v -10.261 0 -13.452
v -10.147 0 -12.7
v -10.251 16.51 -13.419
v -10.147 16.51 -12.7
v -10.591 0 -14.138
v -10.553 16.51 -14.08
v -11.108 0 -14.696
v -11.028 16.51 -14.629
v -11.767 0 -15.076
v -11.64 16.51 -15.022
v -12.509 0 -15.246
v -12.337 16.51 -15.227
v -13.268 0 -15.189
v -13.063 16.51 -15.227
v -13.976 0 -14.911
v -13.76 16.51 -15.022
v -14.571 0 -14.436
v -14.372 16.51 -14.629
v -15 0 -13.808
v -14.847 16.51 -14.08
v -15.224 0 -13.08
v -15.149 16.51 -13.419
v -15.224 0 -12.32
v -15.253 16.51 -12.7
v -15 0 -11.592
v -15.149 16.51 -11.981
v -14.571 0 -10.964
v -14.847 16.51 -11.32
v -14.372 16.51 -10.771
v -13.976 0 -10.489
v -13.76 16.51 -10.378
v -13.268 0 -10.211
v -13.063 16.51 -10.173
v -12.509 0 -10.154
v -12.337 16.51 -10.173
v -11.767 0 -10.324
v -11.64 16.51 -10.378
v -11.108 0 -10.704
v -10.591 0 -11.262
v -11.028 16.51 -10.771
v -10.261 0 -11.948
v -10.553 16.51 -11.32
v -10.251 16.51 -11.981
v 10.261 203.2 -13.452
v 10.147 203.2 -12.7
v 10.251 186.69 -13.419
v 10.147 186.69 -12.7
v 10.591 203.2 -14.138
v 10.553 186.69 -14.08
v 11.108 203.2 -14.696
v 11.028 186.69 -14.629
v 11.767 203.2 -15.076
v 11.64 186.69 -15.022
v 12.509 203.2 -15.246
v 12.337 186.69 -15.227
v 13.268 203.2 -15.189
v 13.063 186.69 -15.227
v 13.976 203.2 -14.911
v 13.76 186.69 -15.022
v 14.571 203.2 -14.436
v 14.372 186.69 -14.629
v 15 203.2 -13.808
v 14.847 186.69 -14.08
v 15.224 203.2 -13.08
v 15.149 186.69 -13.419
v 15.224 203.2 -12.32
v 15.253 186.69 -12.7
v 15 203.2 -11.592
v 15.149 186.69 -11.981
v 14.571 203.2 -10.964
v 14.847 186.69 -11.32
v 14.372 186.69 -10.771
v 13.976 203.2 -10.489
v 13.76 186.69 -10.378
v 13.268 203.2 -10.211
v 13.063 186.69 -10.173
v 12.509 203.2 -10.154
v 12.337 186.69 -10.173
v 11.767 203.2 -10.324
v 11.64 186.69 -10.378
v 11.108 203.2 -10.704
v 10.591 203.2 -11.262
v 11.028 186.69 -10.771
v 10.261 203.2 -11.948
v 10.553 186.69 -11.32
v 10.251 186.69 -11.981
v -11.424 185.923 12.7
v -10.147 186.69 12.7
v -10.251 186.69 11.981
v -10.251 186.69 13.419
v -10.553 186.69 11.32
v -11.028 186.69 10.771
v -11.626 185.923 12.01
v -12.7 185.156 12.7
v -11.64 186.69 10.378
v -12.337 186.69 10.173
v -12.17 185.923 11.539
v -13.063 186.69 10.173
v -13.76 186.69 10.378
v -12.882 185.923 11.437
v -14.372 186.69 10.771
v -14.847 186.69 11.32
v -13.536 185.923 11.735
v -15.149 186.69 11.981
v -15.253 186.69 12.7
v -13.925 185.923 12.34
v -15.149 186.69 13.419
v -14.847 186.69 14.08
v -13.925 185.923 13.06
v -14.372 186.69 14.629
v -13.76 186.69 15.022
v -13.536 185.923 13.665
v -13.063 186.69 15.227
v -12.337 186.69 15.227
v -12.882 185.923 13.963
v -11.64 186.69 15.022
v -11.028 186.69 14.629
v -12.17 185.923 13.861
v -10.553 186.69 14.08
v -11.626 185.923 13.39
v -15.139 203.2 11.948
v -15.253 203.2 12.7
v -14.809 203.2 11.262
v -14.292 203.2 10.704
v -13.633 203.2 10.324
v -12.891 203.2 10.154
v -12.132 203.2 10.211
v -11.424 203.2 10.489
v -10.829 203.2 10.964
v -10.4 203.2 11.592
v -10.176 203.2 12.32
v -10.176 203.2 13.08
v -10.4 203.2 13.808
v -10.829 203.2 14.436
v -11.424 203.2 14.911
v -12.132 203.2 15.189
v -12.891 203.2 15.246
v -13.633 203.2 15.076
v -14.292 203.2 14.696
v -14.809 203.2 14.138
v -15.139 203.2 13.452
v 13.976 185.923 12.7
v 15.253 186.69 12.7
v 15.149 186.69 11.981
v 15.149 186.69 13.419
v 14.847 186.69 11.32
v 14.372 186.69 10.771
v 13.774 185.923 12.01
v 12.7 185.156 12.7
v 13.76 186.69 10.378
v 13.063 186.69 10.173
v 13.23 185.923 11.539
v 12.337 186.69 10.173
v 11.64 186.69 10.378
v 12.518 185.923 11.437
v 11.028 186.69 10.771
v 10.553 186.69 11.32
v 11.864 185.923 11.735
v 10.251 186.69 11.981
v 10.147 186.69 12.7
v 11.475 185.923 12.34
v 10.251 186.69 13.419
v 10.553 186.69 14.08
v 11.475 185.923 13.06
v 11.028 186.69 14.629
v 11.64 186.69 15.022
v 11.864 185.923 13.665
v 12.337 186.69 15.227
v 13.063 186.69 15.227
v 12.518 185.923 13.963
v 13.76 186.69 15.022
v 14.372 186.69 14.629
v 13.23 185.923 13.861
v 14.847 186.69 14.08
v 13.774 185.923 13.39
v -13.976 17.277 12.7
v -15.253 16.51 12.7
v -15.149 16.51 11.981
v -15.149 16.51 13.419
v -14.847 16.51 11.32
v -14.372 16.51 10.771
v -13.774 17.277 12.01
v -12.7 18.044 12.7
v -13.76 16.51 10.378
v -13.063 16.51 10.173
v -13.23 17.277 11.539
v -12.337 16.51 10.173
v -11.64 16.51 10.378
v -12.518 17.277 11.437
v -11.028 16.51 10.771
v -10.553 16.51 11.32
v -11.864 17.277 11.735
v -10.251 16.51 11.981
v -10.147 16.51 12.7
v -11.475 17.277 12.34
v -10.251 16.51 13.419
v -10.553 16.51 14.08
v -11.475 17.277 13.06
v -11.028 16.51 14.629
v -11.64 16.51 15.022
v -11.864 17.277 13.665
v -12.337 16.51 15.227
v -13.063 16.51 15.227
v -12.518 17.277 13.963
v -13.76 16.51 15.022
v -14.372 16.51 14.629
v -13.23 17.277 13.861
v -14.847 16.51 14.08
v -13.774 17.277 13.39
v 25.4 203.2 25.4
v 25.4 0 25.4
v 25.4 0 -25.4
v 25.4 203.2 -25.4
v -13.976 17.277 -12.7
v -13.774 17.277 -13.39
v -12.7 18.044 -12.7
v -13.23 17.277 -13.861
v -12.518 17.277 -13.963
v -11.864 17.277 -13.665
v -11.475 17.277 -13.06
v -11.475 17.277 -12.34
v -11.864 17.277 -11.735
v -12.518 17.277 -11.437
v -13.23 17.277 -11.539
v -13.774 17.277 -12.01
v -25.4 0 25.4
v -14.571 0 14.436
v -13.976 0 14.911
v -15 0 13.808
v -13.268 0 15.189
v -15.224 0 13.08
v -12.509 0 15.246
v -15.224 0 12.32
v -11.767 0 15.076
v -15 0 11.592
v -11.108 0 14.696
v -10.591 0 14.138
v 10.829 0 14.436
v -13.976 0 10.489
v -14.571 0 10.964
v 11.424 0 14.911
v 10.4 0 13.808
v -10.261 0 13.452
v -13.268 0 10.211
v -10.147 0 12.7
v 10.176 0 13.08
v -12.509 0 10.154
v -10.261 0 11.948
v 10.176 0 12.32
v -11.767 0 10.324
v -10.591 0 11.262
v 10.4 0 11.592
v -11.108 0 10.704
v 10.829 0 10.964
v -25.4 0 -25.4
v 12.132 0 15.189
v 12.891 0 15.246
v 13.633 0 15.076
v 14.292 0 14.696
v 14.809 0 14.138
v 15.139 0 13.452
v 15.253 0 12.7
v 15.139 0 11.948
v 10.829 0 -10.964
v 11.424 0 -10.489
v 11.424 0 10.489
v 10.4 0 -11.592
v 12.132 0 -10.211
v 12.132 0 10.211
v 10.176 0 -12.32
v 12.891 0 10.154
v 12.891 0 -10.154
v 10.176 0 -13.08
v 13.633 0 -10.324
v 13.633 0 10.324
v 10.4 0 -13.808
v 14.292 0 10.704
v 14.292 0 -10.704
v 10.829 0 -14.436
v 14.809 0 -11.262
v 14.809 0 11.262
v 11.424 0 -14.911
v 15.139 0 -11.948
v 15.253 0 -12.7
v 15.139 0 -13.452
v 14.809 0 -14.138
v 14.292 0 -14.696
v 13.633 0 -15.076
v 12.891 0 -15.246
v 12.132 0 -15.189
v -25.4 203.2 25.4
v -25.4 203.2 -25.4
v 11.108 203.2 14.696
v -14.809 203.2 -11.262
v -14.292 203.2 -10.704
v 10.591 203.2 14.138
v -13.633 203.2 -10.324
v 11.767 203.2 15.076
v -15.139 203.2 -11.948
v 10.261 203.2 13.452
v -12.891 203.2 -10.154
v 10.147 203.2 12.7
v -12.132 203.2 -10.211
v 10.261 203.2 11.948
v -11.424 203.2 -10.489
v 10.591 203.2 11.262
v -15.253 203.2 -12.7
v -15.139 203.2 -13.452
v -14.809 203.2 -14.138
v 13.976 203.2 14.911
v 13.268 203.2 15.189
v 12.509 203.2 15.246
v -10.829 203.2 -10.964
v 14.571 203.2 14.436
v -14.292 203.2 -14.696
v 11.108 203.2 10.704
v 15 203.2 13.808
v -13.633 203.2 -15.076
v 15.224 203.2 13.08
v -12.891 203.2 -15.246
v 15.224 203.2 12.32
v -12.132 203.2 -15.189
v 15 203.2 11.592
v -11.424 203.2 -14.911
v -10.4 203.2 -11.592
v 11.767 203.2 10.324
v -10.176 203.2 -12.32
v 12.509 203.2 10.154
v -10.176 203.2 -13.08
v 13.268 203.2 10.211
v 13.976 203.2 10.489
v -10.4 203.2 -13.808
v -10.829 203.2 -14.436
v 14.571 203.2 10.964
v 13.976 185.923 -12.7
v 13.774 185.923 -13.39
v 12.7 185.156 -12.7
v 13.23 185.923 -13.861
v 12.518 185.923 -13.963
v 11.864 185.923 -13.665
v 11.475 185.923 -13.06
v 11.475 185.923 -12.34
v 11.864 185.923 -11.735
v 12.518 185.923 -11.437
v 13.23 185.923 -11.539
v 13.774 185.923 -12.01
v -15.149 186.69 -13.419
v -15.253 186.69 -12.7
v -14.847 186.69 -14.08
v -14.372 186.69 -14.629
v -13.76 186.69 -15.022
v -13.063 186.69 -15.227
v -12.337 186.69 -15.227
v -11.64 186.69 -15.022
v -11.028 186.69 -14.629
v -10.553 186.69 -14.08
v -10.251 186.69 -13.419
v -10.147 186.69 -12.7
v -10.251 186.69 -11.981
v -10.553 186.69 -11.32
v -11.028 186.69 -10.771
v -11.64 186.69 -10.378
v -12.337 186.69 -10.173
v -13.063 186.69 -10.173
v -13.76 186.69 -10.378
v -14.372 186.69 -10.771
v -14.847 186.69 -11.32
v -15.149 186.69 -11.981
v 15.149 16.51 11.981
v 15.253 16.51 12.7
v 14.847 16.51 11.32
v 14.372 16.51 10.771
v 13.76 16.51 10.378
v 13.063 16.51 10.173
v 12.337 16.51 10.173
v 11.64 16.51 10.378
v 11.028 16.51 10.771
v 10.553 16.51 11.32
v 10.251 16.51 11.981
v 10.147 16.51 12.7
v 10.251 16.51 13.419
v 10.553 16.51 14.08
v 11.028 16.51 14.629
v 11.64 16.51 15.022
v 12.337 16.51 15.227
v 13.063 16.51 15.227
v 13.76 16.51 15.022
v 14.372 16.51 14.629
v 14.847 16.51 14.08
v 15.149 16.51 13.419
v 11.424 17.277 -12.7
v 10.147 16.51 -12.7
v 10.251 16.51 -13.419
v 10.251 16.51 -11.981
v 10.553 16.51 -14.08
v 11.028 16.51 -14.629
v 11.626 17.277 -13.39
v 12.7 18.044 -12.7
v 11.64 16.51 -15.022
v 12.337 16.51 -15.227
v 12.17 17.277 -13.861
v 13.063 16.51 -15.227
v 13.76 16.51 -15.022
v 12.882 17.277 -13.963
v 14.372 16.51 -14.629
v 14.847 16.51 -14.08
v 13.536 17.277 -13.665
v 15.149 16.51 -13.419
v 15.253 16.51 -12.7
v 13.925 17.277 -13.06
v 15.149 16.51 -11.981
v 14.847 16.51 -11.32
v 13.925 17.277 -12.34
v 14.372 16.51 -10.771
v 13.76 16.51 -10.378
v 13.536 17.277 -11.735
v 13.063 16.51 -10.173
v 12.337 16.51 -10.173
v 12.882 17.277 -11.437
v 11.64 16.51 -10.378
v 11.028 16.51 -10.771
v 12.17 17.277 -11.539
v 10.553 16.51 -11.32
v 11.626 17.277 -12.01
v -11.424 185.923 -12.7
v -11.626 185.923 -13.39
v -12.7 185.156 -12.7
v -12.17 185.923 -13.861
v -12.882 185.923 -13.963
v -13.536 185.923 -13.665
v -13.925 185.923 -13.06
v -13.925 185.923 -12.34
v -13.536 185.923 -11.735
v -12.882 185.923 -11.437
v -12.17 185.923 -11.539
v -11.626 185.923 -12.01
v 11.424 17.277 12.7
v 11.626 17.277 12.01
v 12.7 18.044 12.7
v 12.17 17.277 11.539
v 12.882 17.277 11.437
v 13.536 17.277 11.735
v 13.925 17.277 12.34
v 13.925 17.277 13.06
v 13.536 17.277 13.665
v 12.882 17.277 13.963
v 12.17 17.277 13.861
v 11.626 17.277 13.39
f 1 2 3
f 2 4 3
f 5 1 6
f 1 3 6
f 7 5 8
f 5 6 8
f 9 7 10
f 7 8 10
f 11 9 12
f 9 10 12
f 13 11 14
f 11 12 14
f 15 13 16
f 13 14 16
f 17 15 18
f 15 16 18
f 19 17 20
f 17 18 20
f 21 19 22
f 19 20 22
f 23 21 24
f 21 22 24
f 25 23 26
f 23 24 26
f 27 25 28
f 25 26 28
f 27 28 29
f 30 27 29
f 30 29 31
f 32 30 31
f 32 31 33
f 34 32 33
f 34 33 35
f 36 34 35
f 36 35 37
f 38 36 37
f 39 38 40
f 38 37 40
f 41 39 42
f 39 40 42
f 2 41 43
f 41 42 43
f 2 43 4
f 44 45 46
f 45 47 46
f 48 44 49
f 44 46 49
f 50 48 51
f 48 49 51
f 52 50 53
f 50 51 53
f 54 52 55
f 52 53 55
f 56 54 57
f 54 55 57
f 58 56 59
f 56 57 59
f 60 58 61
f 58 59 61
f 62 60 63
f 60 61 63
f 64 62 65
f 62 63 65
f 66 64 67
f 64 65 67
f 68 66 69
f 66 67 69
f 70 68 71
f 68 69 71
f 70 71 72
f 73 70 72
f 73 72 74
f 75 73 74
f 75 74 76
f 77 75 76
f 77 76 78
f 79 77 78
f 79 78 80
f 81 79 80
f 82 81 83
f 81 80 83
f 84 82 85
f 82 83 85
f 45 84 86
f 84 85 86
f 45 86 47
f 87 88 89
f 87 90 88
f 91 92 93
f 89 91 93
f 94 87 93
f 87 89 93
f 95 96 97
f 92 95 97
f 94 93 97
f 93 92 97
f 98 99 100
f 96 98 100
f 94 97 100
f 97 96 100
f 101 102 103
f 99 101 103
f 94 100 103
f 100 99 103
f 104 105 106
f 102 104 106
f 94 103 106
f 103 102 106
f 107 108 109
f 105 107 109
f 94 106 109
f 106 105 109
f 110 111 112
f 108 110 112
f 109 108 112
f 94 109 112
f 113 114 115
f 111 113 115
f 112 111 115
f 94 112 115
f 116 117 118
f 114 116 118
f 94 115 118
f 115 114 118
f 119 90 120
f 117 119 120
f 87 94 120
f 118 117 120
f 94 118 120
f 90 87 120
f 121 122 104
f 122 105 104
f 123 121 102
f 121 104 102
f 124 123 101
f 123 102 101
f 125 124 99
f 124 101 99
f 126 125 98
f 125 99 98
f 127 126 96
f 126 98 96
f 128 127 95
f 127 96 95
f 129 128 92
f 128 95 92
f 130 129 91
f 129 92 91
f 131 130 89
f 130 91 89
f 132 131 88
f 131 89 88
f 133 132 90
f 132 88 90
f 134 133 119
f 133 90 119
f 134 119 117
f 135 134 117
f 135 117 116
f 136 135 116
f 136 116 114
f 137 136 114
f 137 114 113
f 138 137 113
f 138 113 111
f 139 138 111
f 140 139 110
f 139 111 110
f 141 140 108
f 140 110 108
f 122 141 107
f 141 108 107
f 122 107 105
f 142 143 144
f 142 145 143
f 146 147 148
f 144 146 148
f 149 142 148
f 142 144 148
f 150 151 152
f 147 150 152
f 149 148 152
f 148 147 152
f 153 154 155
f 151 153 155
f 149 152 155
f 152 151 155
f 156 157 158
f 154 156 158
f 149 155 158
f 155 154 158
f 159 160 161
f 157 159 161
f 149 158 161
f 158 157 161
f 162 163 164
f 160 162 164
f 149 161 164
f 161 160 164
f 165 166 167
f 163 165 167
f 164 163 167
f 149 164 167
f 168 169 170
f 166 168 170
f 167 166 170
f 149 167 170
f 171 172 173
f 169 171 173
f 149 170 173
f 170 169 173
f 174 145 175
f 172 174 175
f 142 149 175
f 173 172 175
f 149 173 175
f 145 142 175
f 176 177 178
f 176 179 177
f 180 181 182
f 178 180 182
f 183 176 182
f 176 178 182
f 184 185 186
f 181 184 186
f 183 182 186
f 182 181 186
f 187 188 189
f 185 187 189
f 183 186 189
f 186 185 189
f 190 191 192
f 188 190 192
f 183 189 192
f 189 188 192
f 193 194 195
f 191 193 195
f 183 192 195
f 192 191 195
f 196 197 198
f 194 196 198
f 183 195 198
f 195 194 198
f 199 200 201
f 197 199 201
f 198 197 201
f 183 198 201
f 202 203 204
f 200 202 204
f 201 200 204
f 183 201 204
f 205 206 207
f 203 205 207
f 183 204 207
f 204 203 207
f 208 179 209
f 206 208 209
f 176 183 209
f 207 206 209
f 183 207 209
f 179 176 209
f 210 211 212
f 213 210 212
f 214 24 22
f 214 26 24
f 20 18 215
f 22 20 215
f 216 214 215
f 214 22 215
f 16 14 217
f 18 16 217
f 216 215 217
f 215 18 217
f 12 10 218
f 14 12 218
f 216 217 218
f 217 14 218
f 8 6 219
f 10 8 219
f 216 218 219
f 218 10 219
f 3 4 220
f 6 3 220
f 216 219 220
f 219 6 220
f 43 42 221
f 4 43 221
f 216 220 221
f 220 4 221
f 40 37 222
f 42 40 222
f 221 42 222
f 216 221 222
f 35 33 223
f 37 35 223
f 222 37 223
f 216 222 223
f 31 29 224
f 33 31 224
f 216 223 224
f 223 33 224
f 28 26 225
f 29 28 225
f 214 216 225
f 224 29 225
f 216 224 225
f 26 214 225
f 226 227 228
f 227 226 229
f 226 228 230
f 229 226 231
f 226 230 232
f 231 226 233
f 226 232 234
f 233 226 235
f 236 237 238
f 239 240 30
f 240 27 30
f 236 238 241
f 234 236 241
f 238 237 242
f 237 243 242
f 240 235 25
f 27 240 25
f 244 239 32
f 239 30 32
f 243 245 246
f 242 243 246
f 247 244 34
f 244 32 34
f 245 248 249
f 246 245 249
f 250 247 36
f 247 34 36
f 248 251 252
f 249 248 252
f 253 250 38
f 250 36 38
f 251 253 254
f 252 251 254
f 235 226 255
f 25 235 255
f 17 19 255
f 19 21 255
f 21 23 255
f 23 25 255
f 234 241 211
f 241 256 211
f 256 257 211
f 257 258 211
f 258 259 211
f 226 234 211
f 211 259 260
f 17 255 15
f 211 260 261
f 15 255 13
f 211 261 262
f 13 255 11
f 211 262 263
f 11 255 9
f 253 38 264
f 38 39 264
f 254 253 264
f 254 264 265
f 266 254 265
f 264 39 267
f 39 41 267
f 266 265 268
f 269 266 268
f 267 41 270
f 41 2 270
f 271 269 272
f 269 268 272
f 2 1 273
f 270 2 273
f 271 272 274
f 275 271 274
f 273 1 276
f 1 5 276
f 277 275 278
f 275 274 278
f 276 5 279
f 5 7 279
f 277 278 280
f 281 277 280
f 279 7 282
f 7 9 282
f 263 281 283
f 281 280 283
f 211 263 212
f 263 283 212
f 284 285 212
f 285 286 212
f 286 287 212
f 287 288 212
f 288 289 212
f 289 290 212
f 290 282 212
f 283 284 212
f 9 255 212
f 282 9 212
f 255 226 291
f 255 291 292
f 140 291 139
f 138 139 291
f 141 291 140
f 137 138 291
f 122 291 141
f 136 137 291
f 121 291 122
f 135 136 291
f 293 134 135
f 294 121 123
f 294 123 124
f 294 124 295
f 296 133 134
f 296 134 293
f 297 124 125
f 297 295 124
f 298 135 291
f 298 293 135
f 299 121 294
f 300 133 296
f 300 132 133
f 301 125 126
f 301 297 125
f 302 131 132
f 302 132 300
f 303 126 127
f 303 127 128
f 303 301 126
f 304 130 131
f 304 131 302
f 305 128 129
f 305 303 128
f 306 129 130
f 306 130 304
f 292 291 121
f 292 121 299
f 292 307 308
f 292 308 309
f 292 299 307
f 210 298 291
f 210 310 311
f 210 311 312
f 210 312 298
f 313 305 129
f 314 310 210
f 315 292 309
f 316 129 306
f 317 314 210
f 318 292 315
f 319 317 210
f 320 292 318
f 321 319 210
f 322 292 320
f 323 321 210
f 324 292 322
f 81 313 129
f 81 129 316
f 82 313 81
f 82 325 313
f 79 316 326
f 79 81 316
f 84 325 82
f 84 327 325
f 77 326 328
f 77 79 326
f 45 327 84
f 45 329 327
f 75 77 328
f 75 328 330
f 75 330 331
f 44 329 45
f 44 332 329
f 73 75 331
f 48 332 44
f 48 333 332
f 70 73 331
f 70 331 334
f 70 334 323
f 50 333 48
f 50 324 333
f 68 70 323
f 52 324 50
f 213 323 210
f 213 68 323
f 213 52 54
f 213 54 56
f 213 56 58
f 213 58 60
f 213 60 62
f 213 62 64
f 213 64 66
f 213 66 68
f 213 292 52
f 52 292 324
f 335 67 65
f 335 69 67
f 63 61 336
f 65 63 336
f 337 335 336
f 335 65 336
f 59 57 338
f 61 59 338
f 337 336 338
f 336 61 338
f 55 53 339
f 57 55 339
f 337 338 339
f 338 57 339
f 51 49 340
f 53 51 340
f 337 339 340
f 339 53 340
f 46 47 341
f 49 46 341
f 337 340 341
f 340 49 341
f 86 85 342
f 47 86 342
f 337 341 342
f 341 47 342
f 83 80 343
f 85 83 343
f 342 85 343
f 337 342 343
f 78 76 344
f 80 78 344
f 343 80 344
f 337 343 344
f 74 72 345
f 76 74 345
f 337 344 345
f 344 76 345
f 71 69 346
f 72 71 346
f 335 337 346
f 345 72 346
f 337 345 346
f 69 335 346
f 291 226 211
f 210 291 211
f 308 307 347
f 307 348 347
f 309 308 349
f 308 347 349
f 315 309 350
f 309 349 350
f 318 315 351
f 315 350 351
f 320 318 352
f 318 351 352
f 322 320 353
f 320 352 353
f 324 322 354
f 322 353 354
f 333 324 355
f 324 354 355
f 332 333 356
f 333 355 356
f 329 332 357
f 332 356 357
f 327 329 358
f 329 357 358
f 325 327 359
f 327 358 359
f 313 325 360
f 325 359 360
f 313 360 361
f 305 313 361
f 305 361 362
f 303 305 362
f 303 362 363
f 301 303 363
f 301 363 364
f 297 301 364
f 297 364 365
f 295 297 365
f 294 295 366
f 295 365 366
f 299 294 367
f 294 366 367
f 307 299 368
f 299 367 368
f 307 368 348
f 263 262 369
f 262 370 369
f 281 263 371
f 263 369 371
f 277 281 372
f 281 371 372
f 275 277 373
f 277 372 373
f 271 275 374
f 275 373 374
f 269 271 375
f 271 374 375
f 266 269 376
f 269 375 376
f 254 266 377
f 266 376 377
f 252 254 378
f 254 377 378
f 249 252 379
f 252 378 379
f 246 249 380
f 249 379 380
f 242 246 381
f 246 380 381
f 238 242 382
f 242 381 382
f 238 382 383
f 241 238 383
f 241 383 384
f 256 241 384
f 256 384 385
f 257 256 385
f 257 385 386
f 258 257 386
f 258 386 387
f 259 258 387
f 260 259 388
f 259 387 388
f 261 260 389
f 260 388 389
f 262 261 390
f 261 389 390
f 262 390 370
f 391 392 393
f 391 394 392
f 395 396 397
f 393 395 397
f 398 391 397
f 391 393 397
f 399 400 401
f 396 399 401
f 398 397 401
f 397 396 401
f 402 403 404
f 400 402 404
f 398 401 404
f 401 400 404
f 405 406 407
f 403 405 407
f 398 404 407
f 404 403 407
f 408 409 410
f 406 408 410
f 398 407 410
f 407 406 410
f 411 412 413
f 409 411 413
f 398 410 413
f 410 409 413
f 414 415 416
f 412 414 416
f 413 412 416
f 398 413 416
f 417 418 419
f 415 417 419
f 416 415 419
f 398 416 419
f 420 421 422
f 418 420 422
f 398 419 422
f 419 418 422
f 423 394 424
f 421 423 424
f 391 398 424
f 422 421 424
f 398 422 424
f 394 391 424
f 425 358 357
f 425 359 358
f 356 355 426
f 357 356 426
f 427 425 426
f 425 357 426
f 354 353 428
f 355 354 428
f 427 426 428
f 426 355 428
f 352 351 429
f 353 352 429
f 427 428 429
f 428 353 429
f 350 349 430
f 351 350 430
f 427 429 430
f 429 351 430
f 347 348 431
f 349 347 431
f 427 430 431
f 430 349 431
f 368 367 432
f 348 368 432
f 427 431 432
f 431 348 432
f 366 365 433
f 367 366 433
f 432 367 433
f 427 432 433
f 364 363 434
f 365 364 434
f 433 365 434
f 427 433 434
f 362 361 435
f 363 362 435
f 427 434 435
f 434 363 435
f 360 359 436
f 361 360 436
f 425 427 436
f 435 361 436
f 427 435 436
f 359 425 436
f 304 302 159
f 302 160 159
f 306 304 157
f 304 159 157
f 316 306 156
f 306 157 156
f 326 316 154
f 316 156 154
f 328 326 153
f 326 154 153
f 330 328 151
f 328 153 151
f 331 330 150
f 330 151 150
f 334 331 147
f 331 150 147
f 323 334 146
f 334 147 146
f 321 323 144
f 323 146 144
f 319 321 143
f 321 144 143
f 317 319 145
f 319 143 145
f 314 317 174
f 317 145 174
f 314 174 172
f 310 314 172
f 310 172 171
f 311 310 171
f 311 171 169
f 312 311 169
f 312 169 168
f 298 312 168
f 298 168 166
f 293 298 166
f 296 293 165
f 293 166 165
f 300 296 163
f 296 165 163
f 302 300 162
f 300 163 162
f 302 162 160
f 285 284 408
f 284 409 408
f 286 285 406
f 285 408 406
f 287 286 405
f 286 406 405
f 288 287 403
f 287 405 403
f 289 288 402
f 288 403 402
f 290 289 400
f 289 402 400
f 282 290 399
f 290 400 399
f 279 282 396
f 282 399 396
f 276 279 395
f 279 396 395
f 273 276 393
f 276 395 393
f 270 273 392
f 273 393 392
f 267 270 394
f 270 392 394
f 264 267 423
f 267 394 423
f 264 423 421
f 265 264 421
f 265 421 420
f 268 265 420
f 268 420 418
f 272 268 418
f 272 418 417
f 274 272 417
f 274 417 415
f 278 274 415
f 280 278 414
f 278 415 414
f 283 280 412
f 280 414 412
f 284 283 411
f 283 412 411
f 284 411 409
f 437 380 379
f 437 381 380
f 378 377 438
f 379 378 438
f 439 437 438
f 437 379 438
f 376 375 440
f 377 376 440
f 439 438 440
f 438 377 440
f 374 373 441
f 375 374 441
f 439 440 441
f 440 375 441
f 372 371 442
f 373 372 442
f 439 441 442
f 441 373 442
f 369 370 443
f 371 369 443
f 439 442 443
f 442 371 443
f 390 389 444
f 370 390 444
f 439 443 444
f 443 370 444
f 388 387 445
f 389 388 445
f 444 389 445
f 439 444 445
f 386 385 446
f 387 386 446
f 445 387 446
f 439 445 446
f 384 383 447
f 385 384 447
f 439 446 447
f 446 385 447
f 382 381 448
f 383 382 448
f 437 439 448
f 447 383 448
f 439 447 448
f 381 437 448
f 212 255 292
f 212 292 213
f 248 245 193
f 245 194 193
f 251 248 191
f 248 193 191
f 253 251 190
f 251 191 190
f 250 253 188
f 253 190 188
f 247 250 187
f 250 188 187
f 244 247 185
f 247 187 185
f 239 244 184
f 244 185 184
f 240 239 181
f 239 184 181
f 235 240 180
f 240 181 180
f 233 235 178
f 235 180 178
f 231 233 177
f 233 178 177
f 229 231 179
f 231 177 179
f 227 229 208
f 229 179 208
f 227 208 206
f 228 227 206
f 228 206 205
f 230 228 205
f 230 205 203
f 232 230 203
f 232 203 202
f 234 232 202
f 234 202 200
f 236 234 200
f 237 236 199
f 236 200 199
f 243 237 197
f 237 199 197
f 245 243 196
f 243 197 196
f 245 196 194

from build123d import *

# Parameters (mm, degrees)
SKETCH1_W                   = 50.8
SKETCH1_H                   = 50.8
BOSS_EXTRUDE1_DEPTH         = 203.2
F_1_4_20_TAPPED_HOLE1_D     = 5.1054
F_1_4_20_TAPPED_HOLE1_DEPTH = 16.51
F_1_4_20_TAPPED_HOLE1_TIP   = 1.533816902
F_1_4_20_TAPPED_HOLE2_D     = 5.1054
F_1_4_20_TAPPED_HOLE2_DEPTH = 16.51
F_1_4_20_TAPPED_HOLE2_TIP   = 1.533816902


with BuildPart() as part:
    # Sketch1 → Boss-Extrude1 (new body)
    with BuildSketch(Plane(origin=(0, 0, 0), x_dir=(1, 0, 0), z_dir=(0, 1, 0))):
        Rectangle(SKETCH1_W, SKETCH1_H)
    extrude(amount=BOSS_EXTRUDE1_DEPTH)

    # 1/4-20 Tapped Hole1
    with Locations(Plane(origin=(0, 203.2, 0), x_dir=(1, 0, 0), z_dir=(0, 1, 0))):
        with Locations((-12.7, 12.7), (12.7, 12.7), (12.7, -12.7), (-12.7, -12.7)):
            Hole(F_1_4_20_TAPPED_HOLE1_D / 2, depth=F_1_4_20_TAPPED_HOLE1_DEPTH)
            with Locations((0, 0, -(F_1_4_20_TAPPED_HOLE1_DEPTH + F_1_4_20_TAPPED_HOLE1_TIP / 2))):  # 118° drill point
                Cone(0, F_1_4_20_TAPPED_HOLE1_D / 2, F_1_4_20_TAPPED_HOLE1_TIP, mode=Mode.SUBTRACT)

    # 1/4-20 Tapped Hole2
    with Locations(Plane(origin=(0, 0, 0), x_dir=(-1, 0, 0), z_dir=(0, -1, 0))):
        with Locations((-12.7, 12.7), (12.7, 12.7), (12.7, -12.7), (-12.7, -12.7)):
            Hole(F_1_4_20_TAPPED_HOLE2_D / 2, depth=F_1_4_20_TAPPED_HOLE2_DEPTH)
            with Locations((0, 0, -(F_1_4_20_TAPPED_HOLE2_DEPTH + F_1_4_20_TAPPED_HOLE2_TIP / 2))):  # 118° drill point
                Cone(0, F_1_4_20_TAPPED_HOLE2_D / 2, F_1_4_20_TAPPED_HOLE2_TIP, mode=Mode.SUBTRACT)


solid = part.part
